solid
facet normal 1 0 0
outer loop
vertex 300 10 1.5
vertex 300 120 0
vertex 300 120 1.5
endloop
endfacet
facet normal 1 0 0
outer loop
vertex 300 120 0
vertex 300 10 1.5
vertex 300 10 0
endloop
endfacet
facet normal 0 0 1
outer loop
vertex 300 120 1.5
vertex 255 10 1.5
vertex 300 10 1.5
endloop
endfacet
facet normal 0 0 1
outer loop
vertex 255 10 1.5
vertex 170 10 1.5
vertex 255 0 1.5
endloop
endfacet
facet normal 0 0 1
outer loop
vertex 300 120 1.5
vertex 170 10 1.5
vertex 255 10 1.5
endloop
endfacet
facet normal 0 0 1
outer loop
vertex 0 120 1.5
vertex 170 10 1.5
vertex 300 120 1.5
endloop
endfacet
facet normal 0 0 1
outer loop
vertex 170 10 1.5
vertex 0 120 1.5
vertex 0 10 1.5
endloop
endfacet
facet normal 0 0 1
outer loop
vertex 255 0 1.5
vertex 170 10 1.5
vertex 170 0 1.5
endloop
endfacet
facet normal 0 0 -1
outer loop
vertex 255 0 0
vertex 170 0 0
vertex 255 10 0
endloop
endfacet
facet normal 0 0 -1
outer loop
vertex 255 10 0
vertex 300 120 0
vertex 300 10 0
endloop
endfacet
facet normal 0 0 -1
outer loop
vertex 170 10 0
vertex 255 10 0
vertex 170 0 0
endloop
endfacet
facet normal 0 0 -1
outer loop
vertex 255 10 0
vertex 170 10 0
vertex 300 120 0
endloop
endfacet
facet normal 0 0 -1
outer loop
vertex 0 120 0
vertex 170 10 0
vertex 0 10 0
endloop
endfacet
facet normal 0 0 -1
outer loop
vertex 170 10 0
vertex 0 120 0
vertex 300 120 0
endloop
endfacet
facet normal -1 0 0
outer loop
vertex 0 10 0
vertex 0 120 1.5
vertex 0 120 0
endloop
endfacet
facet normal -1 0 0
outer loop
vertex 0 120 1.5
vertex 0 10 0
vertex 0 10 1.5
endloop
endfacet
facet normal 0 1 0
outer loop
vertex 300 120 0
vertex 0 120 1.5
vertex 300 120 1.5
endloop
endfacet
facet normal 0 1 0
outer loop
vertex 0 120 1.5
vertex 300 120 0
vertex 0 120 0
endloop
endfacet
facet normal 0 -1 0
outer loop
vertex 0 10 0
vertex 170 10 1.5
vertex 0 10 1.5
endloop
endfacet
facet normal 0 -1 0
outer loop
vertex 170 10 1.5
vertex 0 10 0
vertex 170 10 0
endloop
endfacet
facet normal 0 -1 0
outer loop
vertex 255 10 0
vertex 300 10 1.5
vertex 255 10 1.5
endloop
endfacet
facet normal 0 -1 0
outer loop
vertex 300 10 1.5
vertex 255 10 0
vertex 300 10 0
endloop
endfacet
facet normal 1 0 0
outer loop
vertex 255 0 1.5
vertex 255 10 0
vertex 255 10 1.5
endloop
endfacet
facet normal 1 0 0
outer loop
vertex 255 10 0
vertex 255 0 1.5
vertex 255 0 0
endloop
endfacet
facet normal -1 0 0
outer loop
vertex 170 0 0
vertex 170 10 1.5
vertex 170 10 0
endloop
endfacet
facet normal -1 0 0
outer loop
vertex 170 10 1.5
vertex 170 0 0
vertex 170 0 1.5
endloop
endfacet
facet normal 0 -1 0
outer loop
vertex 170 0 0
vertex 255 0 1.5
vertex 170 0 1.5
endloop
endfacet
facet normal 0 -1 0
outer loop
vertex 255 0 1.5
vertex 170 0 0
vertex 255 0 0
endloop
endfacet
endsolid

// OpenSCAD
// GPU model.

$fn = 50;
OX = 0.01;

// GPU model.
// @param pcb Color of the PCB.
module gpu(pcb = [236/255, 53/255, 57/255]) {
	color(pcb) union() {
		translate([0, 10, 0]) cube([300, 110, 1.5]);
		translate([300 - 85 - 45, 0, 0]) cube([85, 10, 1.5]);
	}
}

// Example:
gpu();
